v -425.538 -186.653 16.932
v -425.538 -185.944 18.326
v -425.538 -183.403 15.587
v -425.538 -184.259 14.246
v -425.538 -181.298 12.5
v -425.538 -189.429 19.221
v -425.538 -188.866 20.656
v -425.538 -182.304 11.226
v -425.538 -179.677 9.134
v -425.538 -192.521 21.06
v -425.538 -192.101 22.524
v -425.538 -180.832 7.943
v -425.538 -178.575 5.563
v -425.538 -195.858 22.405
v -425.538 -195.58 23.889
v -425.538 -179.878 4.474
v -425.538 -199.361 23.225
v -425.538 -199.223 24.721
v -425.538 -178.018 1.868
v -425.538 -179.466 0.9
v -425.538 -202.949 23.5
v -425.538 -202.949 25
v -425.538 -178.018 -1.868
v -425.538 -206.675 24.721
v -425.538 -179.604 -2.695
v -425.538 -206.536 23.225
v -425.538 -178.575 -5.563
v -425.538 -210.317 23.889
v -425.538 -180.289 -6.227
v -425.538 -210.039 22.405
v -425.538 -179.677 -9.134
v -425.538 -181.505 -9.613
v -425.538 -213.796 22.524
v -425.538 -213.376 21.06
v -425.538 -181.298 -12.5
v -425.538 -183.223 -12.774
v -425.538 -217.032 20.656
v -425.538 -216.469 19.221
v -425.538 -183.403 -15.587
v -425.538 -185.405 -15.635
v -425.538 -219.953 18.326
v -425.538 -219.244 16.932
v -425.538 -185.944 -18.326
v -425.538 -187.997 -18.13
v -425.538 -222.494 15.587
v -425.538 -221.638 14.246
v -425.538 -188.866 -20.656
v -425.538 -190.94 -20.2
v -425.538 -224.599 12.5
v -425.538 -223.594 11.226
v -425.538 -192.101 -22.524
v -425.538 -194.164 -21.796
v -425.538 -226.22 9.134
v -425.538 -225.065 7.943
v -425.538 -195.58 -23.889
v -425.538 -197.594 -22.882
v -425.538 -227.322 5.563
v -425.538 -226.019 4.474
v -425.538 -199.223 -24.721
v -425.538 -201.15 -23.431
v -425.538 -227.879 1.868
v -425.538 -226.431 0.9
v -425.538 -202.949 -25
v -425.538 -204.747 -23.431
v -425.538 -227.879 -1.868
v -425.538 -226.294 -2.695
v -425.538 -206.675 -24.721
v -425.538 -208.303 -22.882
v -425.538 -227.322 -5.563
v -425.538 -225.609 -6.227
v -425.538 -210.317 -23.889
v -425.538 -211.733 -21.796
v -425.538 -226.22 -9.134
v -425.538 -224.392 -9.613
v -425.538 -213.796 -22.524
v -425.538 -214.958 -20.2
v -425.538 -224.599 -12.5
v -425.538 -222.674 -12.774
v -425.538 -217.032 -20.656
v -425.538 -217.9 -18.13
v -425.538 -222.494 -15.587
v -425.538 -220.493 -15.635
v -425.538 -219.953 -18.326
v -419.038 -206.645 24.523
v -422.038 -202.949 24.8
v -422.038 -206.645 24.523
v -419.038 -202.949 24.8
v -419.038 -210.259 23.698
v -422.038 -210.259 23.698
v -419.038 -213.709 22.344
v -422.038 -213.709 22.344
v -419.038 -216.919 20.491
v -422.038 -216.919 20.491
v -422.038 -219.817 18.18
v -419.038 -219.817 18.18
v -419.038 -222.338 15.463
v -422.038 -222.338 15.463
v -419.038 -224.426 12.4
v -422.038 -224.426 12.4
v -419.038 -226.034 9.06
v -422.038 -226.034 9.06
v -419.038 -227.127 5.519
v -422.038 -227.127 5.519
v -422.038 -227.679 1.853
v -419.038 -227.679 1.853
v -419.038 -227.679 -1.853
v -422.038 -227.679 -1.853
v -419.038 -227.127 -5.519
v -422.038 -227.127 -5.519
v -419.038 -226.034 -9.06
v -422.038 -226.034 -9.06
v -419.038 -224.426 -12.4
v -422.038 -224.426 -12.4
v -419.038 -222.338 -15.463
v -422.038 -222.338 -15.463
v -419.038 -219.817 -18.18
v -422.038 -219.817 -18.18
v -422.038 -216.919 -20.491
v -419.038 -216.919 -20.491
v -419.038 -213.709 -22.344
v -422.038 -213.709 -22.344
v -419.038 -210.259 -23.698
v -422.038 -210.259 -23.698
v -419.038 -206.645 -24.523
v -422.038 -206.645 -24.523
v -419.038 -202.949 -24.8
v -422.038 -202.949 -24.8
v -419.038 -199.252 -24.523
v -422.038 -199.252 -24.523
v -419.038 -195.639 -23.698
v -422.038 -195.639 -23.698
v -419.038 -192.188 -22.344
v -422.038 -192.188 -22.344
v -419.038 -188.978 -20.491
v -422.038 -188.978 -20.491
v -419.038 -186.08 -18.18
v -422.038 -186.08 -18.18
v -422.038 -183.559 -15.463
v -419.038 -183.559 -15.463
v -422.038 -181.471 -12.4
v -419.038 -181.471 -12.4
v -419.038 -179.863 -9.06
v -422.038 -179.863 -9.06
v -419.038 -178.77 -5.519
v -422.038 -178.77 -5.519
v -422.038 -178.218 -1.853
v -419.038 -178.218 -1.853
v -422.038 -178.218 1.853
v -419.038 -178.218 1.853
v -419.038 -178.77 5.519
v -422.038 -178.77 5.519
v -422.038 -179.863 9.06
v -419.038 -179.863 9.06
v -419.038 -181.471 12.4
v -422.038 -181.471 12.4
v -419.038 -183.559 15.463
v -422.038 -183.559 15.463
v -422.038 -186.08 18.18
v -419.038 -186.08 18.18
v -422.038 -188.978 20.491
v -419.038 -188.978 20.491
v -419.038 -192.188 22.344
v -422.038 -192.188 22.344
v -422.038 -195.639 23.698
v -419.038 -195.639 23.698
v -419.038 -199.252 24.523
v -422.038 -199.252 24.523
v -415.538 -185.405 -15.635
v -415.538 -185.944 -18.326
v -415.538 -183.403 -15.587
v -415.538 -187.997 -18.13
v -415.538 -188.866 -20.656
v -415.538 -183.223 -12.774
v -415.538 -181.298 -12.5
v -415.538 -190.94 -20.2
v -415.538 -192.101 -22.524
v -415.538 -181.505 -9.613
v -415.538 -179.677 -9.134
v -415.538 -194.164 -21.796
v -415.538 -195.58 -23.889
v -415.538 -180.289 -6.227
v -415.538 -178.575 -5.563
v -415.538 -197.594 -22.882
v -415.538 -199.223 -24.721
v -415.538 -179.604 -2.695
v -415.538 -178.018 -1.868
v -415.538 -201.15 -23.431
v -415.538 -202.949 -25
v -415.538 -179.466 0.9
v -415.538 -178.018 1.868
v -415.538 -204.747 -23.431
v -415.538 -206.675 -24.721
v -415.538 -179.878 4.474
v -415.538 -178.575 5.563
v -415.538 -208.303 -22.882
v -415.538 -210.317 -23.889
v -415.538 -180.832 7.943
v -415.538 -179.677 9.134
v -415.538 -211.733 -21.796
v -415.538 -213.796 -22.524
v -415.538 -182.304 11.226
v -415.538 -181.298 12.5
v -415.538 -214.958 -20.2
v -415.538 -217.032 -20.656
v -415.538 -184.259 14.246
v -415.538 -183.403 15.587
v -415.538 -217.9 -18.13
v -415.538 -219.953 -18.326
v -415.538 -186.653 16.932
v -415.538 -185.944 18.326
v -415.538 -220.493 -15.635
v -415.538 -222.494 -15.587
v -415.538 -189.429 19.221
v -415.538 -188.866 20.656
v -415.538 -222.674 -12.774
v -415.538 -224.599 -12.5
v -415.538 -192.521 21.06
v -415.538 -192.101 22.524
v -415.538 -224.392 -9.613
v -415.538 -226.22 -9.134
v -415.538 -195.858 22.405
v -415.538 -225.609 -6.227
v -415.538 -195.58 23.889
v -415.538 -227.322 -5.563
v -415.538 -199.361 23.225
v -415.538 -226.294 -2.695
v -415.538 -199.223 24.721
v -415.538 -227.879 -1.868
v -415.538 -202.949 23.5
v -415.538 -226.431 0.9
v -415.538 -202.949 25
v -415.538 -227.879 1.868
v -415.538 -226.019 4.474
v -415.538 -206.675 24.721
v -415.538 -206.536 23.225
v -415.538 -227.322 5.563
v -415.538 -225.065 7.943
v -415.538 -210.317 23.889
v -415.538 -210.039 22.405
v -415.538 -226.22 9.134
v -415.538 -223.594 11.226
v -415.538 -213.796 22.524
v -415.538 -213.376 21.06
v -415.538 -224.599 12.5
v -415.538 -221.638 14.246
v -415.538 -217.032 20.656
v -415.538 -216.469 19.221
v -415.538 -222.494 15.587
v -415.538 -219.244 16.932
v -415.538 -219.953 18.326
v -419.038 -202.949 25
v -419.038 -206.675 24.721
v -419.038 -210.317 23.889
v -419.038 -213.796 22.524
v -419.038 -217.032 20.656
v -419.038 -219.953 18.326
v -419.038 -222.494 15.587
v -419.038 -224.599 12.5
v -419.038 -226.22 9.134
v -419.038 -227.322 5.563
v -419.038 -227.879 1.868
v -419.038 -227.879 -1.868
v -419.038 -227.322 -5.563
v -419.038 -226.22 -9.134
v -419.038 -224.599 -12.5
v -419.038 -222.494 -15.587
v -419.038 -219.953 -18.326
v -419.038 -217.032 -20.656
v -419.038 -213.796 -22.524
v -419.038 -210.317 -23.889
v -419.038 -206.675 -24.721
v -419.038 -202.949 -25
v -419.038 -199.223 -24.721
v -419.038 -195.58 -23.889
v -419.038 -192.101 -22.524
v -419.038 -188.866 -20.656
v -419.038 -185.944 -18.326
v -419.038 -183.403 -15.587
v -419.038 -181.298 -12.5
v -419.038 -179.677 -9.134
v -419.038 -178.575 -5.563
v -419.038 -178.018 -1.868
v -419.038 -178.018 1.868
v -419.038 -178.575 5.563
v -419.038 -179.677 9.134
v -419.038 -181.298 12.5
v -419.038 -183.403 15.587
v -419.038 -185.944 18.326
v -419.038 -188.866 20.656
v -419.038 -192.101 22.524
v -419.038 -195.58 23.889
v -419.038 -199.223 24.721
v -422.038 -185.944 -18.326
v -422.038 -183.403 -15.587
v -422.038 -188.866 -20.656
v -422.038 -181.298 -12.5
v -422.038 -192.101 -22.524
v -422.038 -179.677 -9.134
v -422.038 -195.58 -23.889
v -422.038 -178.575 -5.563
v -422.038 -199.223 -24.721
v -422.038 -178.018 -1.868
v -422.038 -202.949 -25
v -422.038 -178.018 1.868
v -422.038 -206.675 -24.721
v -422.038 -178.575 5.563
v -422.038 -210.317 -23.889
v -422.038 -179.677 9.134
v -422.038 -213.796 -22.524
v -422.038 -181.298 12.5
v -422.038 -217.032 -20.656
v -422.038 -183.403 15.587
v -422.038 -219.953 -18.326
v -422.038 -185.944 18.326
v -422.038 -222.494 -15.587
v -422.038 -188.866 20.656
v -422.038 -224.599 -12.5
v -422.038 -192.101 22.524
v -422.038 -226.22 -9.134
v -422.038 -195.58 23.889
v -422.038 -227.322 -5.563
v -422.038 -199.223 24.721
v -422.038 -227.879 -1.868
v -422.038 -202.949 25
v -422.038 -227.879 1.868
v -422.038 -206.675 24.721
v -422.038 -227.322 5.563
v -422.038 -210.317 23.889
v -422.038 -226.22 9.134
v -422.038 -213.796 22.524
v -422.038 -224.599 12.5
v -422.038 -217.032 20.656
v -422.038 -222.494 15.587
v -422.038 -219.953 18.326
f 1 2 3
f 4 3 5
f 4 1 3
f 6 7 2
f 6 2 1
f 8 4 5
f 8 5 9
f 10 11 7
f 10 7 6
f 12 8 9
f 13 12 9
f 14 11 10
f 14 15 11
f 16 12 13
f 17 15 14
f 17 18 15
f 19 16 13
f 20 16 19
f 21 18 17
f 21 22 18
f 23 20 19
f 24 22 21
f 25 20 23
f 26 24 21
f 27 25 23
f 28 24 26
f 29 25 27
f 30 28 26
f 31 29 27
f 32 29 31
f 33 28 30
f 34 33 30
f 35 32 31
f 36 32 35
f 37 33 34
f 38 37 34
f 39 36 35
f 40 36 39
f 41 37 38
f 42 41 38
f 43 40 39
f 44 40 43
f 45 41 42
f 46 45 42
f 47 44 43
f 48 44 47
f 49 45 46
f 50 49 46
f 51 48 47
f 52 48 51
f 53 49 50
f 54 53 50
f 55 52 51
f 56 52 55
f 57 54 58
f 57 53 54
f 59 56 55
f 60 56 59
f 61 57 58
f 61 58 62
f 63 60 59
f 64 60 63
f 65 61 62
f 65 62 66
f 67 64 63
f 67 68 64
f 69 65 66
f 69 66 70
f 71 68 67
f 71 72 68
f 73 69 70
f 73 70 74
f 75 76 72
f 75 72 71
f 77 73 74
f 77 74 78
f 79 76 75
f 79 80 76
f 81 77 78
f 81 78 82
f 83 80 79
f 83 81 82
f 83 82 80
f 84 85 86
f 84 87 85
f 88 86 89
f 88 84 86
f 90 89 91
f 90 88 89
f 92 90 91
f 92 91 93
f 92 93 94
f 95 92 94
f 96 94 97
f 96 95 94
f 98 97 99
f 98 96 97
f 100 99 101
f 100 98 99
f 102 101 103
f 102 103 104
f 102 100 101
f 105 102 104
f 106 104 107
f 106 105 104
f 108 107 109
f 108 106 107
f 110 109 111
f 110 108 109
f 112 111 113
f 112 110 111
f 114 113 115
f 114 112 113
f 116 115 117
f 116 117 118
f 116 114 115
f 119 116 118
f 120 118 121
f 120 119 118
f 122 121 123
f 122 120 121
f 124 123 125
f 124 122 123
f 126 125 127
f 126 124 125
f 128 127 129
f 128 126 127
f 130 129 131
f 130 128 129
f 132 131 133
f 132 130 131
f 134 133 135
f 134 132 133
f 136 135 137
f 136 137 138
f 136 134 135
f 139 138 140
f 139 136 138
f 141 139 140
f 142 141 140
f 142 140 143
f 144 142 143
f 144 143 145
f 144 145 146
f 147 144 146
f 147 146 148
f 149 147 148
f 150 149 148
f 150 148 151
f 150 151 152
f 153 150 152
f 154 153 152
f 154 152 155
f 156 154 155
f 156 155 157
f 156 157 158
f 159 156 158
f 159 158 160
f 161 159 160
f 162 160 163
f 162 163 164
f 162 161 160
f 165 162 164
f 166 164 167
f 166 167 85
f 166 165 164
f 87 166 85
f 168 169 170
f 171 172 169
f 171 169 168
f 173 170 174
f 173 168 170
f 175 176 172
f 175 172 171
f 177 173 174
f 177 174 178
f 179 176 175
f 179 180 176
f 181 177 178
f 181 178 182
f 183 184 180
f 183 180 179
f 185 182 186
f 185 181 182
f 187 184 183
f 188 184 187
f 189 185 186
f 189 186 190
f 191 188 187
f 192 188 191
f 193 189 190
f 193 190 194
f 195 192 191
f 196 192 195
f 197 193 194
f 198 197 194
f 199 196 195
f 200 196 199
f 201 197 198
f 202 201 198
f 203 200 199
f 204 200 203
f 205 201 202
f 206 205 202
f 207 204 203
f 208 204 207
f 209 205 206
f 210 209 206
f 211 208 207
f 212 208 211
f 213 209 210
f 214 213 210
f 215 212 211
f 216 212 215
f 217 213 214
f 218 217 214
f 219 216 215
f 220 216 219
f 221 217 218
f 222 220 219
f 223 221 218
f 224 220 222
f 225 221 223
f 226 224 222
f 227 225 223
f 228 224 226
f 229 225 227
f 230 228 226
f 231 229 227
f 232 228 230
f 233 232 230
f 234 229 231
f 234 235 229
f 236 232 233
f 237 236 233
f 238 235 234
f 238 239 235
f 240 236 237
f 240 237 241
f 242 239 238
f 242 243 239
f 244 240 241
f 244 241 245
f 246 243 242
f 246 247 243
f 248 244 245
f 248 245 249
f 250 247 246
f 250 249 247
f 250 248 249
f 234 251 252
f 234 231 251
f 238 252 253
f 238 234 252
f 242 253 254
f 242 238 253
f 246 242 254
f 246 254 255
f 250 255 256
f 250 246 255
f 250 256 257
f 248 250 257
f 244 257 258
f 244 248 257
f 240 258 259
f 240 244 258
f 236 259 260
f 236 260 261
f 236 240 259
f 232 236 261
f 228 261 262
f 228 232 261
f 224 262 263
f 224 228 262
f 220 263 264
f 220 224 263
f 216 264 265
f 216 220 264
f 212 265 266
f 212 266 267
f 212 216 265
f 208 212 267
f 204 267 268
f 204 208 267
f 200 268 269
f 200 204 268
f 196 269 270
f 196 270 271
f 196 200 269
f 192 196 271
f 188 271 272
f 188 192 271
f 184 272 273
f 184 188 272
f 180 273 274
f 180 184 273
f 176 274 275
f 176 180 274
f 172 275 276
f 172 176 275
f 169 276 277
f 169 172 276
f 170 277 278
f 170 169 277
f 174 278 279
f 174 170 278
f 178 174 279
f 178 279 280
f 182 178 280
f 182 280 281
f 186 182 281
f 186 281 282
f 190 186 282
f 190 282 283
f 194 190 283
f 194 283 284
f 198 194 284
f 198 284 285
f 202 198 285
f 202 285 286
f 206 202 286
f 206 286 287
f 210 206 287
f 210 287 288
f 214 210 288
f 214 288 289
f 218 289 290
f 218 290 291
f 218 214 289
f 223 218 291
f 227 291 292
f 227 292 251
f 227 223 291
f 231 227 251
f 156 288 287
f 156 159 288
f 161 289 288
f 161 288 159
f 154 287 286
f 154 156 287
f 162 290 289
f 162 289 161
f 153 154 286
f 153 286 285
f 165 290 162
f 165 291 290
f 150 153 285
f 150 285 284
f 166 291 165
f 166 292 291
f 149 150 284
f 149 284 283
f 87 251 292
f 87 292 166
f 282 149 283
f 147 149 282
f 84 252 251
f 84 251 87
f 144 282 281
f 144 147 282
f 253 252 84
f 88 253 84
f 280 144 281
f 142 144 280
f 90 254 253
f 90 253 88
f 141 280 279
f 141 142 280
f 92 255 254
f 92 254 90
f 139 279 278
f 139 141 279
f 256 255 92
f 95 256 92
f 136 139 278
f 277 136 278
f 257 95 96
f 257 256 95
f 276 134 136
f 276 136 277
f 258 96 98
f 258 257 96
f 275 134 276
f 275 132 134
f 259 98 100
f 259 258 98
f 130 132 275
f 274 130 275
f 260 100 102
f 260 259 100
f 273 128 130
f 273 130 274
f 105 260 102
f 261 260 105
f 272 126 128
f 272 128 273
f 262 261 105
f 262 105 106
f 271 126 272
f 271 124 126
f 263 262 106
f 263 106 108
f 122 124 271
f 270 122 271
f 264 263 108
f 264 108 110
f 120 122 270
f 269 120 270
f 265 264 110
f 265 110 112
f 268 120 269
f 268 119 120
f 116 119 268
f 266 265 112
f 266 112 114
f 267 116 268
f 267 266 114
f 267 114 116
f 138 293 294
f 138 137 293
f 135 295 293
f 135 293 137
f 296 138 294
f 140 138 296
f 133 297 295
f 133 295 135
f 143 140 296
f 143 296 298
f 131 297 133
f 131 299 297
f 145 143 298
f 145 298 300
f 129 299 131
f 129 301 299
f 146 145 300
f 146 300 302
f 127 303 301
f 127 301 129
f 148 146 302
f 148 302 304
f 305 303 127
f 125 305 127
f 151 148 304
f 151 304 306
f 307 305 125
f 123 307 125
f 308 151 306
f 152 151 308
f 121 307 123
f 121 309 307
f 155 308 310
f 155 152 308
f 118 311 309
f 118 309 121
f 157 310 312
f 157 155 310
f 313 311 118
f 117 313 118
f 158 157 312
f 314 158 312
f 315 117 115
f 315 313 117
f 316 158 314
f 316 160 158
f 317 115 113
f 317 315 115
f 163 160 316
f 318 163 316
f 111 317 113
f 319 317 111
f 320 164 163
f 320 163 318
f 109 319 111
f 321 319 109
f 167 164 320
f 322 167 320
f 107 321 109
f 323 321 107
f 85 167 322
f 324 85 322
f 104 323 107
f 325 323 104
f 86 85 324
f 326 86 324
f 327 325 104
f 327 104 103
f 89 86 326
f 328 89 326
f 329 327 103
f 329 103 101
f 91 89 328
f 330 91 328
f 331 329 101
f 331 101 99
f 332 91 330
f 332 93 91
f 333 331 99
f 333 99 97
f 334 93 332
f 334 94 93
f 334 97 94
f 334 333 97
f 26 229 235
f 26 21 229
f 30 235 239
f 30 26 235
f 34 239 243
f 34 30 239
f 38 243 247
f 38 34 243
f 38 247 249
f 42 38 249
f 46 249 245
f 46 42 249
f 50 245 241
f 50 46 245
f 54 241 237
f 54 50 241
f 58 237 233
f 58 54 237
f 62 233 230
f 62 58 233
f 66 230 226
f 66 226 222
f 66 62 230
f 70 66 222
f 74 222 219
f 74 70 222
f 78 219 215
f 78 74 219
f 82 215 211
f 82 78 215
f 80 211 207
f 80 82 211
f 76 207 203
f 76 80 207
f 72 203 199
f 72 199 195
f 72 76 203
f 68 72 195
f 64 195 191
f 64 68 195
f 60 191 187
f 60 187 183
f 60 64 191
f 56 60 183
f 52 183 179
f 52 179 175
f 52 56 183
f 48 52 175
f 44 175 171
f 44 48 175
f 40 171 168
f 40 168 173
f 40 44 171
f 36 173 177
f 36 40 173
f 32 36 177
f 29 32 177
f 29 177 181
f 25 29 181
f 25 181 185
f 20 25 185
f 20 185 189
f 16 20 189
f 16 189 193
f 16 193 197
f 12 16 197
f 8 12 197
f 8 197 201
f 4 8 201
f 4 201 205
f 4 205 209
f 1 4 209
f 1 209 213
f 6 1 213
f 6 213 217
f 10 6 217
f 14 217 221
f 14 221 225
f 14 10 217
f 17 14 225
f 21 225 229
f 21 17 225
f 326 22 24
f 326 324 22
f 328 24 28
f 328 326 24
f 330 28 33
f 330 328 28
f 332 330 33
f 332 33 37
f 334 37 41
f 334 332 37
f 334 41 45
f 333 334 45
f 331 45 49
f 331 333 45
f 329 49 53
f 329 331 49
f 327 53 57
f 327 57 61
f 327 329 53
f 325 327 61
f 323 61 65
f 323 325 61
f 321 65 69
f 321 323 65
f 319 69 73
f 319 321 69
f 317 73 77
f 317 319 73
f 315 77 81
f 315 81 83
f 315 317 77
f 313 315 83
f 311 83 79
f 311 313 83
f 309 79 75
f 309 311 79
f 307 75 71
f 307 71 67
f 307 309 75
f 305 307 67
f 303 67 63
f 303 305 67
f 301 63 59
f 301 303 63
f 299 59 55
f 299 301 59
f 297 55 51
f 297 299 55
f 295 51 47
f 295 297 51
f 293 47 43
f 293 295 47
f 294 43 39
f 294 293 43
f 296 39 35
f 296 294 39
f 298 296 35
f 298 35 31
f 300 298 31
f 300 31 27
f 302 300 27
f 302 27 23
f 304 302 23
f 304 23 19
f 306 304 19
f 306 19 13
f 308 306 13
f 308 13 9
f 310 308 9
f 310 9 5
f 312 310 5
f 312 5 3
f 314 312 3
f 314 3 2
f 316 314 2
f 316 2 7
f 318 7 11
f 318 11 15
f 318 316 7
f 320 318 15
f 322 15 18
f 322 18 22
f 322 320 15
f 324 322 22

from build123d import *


with BuildPart() as part:
    # Szkic2 → Obrót1 (revolve)
    with BuildSketch(Plane.XY, mode=Mode.PRIVATE) as obr_t1_sk:
        Polygon((-425.537809827, -177.948573753), (-422.037809827, -177.948573753), (-422.037809827, -178.148573753), (-419.037809827, -178.148573753), (-419.037809827, -177.948573753), (-415.537809827, -177.948573753), (-415.537809827, -179.448573753), (-425.537809827, -179.448573753), align=None)
    revolve(obr_t1_sk.sketch.rotate(Axis((-411.49910078, -202.948573753, 0), (1, 0, 0)), 90), axis=Axis((-411.49910078, -202.948573753, 0), (1, 0, 0)))


solid = part.part
